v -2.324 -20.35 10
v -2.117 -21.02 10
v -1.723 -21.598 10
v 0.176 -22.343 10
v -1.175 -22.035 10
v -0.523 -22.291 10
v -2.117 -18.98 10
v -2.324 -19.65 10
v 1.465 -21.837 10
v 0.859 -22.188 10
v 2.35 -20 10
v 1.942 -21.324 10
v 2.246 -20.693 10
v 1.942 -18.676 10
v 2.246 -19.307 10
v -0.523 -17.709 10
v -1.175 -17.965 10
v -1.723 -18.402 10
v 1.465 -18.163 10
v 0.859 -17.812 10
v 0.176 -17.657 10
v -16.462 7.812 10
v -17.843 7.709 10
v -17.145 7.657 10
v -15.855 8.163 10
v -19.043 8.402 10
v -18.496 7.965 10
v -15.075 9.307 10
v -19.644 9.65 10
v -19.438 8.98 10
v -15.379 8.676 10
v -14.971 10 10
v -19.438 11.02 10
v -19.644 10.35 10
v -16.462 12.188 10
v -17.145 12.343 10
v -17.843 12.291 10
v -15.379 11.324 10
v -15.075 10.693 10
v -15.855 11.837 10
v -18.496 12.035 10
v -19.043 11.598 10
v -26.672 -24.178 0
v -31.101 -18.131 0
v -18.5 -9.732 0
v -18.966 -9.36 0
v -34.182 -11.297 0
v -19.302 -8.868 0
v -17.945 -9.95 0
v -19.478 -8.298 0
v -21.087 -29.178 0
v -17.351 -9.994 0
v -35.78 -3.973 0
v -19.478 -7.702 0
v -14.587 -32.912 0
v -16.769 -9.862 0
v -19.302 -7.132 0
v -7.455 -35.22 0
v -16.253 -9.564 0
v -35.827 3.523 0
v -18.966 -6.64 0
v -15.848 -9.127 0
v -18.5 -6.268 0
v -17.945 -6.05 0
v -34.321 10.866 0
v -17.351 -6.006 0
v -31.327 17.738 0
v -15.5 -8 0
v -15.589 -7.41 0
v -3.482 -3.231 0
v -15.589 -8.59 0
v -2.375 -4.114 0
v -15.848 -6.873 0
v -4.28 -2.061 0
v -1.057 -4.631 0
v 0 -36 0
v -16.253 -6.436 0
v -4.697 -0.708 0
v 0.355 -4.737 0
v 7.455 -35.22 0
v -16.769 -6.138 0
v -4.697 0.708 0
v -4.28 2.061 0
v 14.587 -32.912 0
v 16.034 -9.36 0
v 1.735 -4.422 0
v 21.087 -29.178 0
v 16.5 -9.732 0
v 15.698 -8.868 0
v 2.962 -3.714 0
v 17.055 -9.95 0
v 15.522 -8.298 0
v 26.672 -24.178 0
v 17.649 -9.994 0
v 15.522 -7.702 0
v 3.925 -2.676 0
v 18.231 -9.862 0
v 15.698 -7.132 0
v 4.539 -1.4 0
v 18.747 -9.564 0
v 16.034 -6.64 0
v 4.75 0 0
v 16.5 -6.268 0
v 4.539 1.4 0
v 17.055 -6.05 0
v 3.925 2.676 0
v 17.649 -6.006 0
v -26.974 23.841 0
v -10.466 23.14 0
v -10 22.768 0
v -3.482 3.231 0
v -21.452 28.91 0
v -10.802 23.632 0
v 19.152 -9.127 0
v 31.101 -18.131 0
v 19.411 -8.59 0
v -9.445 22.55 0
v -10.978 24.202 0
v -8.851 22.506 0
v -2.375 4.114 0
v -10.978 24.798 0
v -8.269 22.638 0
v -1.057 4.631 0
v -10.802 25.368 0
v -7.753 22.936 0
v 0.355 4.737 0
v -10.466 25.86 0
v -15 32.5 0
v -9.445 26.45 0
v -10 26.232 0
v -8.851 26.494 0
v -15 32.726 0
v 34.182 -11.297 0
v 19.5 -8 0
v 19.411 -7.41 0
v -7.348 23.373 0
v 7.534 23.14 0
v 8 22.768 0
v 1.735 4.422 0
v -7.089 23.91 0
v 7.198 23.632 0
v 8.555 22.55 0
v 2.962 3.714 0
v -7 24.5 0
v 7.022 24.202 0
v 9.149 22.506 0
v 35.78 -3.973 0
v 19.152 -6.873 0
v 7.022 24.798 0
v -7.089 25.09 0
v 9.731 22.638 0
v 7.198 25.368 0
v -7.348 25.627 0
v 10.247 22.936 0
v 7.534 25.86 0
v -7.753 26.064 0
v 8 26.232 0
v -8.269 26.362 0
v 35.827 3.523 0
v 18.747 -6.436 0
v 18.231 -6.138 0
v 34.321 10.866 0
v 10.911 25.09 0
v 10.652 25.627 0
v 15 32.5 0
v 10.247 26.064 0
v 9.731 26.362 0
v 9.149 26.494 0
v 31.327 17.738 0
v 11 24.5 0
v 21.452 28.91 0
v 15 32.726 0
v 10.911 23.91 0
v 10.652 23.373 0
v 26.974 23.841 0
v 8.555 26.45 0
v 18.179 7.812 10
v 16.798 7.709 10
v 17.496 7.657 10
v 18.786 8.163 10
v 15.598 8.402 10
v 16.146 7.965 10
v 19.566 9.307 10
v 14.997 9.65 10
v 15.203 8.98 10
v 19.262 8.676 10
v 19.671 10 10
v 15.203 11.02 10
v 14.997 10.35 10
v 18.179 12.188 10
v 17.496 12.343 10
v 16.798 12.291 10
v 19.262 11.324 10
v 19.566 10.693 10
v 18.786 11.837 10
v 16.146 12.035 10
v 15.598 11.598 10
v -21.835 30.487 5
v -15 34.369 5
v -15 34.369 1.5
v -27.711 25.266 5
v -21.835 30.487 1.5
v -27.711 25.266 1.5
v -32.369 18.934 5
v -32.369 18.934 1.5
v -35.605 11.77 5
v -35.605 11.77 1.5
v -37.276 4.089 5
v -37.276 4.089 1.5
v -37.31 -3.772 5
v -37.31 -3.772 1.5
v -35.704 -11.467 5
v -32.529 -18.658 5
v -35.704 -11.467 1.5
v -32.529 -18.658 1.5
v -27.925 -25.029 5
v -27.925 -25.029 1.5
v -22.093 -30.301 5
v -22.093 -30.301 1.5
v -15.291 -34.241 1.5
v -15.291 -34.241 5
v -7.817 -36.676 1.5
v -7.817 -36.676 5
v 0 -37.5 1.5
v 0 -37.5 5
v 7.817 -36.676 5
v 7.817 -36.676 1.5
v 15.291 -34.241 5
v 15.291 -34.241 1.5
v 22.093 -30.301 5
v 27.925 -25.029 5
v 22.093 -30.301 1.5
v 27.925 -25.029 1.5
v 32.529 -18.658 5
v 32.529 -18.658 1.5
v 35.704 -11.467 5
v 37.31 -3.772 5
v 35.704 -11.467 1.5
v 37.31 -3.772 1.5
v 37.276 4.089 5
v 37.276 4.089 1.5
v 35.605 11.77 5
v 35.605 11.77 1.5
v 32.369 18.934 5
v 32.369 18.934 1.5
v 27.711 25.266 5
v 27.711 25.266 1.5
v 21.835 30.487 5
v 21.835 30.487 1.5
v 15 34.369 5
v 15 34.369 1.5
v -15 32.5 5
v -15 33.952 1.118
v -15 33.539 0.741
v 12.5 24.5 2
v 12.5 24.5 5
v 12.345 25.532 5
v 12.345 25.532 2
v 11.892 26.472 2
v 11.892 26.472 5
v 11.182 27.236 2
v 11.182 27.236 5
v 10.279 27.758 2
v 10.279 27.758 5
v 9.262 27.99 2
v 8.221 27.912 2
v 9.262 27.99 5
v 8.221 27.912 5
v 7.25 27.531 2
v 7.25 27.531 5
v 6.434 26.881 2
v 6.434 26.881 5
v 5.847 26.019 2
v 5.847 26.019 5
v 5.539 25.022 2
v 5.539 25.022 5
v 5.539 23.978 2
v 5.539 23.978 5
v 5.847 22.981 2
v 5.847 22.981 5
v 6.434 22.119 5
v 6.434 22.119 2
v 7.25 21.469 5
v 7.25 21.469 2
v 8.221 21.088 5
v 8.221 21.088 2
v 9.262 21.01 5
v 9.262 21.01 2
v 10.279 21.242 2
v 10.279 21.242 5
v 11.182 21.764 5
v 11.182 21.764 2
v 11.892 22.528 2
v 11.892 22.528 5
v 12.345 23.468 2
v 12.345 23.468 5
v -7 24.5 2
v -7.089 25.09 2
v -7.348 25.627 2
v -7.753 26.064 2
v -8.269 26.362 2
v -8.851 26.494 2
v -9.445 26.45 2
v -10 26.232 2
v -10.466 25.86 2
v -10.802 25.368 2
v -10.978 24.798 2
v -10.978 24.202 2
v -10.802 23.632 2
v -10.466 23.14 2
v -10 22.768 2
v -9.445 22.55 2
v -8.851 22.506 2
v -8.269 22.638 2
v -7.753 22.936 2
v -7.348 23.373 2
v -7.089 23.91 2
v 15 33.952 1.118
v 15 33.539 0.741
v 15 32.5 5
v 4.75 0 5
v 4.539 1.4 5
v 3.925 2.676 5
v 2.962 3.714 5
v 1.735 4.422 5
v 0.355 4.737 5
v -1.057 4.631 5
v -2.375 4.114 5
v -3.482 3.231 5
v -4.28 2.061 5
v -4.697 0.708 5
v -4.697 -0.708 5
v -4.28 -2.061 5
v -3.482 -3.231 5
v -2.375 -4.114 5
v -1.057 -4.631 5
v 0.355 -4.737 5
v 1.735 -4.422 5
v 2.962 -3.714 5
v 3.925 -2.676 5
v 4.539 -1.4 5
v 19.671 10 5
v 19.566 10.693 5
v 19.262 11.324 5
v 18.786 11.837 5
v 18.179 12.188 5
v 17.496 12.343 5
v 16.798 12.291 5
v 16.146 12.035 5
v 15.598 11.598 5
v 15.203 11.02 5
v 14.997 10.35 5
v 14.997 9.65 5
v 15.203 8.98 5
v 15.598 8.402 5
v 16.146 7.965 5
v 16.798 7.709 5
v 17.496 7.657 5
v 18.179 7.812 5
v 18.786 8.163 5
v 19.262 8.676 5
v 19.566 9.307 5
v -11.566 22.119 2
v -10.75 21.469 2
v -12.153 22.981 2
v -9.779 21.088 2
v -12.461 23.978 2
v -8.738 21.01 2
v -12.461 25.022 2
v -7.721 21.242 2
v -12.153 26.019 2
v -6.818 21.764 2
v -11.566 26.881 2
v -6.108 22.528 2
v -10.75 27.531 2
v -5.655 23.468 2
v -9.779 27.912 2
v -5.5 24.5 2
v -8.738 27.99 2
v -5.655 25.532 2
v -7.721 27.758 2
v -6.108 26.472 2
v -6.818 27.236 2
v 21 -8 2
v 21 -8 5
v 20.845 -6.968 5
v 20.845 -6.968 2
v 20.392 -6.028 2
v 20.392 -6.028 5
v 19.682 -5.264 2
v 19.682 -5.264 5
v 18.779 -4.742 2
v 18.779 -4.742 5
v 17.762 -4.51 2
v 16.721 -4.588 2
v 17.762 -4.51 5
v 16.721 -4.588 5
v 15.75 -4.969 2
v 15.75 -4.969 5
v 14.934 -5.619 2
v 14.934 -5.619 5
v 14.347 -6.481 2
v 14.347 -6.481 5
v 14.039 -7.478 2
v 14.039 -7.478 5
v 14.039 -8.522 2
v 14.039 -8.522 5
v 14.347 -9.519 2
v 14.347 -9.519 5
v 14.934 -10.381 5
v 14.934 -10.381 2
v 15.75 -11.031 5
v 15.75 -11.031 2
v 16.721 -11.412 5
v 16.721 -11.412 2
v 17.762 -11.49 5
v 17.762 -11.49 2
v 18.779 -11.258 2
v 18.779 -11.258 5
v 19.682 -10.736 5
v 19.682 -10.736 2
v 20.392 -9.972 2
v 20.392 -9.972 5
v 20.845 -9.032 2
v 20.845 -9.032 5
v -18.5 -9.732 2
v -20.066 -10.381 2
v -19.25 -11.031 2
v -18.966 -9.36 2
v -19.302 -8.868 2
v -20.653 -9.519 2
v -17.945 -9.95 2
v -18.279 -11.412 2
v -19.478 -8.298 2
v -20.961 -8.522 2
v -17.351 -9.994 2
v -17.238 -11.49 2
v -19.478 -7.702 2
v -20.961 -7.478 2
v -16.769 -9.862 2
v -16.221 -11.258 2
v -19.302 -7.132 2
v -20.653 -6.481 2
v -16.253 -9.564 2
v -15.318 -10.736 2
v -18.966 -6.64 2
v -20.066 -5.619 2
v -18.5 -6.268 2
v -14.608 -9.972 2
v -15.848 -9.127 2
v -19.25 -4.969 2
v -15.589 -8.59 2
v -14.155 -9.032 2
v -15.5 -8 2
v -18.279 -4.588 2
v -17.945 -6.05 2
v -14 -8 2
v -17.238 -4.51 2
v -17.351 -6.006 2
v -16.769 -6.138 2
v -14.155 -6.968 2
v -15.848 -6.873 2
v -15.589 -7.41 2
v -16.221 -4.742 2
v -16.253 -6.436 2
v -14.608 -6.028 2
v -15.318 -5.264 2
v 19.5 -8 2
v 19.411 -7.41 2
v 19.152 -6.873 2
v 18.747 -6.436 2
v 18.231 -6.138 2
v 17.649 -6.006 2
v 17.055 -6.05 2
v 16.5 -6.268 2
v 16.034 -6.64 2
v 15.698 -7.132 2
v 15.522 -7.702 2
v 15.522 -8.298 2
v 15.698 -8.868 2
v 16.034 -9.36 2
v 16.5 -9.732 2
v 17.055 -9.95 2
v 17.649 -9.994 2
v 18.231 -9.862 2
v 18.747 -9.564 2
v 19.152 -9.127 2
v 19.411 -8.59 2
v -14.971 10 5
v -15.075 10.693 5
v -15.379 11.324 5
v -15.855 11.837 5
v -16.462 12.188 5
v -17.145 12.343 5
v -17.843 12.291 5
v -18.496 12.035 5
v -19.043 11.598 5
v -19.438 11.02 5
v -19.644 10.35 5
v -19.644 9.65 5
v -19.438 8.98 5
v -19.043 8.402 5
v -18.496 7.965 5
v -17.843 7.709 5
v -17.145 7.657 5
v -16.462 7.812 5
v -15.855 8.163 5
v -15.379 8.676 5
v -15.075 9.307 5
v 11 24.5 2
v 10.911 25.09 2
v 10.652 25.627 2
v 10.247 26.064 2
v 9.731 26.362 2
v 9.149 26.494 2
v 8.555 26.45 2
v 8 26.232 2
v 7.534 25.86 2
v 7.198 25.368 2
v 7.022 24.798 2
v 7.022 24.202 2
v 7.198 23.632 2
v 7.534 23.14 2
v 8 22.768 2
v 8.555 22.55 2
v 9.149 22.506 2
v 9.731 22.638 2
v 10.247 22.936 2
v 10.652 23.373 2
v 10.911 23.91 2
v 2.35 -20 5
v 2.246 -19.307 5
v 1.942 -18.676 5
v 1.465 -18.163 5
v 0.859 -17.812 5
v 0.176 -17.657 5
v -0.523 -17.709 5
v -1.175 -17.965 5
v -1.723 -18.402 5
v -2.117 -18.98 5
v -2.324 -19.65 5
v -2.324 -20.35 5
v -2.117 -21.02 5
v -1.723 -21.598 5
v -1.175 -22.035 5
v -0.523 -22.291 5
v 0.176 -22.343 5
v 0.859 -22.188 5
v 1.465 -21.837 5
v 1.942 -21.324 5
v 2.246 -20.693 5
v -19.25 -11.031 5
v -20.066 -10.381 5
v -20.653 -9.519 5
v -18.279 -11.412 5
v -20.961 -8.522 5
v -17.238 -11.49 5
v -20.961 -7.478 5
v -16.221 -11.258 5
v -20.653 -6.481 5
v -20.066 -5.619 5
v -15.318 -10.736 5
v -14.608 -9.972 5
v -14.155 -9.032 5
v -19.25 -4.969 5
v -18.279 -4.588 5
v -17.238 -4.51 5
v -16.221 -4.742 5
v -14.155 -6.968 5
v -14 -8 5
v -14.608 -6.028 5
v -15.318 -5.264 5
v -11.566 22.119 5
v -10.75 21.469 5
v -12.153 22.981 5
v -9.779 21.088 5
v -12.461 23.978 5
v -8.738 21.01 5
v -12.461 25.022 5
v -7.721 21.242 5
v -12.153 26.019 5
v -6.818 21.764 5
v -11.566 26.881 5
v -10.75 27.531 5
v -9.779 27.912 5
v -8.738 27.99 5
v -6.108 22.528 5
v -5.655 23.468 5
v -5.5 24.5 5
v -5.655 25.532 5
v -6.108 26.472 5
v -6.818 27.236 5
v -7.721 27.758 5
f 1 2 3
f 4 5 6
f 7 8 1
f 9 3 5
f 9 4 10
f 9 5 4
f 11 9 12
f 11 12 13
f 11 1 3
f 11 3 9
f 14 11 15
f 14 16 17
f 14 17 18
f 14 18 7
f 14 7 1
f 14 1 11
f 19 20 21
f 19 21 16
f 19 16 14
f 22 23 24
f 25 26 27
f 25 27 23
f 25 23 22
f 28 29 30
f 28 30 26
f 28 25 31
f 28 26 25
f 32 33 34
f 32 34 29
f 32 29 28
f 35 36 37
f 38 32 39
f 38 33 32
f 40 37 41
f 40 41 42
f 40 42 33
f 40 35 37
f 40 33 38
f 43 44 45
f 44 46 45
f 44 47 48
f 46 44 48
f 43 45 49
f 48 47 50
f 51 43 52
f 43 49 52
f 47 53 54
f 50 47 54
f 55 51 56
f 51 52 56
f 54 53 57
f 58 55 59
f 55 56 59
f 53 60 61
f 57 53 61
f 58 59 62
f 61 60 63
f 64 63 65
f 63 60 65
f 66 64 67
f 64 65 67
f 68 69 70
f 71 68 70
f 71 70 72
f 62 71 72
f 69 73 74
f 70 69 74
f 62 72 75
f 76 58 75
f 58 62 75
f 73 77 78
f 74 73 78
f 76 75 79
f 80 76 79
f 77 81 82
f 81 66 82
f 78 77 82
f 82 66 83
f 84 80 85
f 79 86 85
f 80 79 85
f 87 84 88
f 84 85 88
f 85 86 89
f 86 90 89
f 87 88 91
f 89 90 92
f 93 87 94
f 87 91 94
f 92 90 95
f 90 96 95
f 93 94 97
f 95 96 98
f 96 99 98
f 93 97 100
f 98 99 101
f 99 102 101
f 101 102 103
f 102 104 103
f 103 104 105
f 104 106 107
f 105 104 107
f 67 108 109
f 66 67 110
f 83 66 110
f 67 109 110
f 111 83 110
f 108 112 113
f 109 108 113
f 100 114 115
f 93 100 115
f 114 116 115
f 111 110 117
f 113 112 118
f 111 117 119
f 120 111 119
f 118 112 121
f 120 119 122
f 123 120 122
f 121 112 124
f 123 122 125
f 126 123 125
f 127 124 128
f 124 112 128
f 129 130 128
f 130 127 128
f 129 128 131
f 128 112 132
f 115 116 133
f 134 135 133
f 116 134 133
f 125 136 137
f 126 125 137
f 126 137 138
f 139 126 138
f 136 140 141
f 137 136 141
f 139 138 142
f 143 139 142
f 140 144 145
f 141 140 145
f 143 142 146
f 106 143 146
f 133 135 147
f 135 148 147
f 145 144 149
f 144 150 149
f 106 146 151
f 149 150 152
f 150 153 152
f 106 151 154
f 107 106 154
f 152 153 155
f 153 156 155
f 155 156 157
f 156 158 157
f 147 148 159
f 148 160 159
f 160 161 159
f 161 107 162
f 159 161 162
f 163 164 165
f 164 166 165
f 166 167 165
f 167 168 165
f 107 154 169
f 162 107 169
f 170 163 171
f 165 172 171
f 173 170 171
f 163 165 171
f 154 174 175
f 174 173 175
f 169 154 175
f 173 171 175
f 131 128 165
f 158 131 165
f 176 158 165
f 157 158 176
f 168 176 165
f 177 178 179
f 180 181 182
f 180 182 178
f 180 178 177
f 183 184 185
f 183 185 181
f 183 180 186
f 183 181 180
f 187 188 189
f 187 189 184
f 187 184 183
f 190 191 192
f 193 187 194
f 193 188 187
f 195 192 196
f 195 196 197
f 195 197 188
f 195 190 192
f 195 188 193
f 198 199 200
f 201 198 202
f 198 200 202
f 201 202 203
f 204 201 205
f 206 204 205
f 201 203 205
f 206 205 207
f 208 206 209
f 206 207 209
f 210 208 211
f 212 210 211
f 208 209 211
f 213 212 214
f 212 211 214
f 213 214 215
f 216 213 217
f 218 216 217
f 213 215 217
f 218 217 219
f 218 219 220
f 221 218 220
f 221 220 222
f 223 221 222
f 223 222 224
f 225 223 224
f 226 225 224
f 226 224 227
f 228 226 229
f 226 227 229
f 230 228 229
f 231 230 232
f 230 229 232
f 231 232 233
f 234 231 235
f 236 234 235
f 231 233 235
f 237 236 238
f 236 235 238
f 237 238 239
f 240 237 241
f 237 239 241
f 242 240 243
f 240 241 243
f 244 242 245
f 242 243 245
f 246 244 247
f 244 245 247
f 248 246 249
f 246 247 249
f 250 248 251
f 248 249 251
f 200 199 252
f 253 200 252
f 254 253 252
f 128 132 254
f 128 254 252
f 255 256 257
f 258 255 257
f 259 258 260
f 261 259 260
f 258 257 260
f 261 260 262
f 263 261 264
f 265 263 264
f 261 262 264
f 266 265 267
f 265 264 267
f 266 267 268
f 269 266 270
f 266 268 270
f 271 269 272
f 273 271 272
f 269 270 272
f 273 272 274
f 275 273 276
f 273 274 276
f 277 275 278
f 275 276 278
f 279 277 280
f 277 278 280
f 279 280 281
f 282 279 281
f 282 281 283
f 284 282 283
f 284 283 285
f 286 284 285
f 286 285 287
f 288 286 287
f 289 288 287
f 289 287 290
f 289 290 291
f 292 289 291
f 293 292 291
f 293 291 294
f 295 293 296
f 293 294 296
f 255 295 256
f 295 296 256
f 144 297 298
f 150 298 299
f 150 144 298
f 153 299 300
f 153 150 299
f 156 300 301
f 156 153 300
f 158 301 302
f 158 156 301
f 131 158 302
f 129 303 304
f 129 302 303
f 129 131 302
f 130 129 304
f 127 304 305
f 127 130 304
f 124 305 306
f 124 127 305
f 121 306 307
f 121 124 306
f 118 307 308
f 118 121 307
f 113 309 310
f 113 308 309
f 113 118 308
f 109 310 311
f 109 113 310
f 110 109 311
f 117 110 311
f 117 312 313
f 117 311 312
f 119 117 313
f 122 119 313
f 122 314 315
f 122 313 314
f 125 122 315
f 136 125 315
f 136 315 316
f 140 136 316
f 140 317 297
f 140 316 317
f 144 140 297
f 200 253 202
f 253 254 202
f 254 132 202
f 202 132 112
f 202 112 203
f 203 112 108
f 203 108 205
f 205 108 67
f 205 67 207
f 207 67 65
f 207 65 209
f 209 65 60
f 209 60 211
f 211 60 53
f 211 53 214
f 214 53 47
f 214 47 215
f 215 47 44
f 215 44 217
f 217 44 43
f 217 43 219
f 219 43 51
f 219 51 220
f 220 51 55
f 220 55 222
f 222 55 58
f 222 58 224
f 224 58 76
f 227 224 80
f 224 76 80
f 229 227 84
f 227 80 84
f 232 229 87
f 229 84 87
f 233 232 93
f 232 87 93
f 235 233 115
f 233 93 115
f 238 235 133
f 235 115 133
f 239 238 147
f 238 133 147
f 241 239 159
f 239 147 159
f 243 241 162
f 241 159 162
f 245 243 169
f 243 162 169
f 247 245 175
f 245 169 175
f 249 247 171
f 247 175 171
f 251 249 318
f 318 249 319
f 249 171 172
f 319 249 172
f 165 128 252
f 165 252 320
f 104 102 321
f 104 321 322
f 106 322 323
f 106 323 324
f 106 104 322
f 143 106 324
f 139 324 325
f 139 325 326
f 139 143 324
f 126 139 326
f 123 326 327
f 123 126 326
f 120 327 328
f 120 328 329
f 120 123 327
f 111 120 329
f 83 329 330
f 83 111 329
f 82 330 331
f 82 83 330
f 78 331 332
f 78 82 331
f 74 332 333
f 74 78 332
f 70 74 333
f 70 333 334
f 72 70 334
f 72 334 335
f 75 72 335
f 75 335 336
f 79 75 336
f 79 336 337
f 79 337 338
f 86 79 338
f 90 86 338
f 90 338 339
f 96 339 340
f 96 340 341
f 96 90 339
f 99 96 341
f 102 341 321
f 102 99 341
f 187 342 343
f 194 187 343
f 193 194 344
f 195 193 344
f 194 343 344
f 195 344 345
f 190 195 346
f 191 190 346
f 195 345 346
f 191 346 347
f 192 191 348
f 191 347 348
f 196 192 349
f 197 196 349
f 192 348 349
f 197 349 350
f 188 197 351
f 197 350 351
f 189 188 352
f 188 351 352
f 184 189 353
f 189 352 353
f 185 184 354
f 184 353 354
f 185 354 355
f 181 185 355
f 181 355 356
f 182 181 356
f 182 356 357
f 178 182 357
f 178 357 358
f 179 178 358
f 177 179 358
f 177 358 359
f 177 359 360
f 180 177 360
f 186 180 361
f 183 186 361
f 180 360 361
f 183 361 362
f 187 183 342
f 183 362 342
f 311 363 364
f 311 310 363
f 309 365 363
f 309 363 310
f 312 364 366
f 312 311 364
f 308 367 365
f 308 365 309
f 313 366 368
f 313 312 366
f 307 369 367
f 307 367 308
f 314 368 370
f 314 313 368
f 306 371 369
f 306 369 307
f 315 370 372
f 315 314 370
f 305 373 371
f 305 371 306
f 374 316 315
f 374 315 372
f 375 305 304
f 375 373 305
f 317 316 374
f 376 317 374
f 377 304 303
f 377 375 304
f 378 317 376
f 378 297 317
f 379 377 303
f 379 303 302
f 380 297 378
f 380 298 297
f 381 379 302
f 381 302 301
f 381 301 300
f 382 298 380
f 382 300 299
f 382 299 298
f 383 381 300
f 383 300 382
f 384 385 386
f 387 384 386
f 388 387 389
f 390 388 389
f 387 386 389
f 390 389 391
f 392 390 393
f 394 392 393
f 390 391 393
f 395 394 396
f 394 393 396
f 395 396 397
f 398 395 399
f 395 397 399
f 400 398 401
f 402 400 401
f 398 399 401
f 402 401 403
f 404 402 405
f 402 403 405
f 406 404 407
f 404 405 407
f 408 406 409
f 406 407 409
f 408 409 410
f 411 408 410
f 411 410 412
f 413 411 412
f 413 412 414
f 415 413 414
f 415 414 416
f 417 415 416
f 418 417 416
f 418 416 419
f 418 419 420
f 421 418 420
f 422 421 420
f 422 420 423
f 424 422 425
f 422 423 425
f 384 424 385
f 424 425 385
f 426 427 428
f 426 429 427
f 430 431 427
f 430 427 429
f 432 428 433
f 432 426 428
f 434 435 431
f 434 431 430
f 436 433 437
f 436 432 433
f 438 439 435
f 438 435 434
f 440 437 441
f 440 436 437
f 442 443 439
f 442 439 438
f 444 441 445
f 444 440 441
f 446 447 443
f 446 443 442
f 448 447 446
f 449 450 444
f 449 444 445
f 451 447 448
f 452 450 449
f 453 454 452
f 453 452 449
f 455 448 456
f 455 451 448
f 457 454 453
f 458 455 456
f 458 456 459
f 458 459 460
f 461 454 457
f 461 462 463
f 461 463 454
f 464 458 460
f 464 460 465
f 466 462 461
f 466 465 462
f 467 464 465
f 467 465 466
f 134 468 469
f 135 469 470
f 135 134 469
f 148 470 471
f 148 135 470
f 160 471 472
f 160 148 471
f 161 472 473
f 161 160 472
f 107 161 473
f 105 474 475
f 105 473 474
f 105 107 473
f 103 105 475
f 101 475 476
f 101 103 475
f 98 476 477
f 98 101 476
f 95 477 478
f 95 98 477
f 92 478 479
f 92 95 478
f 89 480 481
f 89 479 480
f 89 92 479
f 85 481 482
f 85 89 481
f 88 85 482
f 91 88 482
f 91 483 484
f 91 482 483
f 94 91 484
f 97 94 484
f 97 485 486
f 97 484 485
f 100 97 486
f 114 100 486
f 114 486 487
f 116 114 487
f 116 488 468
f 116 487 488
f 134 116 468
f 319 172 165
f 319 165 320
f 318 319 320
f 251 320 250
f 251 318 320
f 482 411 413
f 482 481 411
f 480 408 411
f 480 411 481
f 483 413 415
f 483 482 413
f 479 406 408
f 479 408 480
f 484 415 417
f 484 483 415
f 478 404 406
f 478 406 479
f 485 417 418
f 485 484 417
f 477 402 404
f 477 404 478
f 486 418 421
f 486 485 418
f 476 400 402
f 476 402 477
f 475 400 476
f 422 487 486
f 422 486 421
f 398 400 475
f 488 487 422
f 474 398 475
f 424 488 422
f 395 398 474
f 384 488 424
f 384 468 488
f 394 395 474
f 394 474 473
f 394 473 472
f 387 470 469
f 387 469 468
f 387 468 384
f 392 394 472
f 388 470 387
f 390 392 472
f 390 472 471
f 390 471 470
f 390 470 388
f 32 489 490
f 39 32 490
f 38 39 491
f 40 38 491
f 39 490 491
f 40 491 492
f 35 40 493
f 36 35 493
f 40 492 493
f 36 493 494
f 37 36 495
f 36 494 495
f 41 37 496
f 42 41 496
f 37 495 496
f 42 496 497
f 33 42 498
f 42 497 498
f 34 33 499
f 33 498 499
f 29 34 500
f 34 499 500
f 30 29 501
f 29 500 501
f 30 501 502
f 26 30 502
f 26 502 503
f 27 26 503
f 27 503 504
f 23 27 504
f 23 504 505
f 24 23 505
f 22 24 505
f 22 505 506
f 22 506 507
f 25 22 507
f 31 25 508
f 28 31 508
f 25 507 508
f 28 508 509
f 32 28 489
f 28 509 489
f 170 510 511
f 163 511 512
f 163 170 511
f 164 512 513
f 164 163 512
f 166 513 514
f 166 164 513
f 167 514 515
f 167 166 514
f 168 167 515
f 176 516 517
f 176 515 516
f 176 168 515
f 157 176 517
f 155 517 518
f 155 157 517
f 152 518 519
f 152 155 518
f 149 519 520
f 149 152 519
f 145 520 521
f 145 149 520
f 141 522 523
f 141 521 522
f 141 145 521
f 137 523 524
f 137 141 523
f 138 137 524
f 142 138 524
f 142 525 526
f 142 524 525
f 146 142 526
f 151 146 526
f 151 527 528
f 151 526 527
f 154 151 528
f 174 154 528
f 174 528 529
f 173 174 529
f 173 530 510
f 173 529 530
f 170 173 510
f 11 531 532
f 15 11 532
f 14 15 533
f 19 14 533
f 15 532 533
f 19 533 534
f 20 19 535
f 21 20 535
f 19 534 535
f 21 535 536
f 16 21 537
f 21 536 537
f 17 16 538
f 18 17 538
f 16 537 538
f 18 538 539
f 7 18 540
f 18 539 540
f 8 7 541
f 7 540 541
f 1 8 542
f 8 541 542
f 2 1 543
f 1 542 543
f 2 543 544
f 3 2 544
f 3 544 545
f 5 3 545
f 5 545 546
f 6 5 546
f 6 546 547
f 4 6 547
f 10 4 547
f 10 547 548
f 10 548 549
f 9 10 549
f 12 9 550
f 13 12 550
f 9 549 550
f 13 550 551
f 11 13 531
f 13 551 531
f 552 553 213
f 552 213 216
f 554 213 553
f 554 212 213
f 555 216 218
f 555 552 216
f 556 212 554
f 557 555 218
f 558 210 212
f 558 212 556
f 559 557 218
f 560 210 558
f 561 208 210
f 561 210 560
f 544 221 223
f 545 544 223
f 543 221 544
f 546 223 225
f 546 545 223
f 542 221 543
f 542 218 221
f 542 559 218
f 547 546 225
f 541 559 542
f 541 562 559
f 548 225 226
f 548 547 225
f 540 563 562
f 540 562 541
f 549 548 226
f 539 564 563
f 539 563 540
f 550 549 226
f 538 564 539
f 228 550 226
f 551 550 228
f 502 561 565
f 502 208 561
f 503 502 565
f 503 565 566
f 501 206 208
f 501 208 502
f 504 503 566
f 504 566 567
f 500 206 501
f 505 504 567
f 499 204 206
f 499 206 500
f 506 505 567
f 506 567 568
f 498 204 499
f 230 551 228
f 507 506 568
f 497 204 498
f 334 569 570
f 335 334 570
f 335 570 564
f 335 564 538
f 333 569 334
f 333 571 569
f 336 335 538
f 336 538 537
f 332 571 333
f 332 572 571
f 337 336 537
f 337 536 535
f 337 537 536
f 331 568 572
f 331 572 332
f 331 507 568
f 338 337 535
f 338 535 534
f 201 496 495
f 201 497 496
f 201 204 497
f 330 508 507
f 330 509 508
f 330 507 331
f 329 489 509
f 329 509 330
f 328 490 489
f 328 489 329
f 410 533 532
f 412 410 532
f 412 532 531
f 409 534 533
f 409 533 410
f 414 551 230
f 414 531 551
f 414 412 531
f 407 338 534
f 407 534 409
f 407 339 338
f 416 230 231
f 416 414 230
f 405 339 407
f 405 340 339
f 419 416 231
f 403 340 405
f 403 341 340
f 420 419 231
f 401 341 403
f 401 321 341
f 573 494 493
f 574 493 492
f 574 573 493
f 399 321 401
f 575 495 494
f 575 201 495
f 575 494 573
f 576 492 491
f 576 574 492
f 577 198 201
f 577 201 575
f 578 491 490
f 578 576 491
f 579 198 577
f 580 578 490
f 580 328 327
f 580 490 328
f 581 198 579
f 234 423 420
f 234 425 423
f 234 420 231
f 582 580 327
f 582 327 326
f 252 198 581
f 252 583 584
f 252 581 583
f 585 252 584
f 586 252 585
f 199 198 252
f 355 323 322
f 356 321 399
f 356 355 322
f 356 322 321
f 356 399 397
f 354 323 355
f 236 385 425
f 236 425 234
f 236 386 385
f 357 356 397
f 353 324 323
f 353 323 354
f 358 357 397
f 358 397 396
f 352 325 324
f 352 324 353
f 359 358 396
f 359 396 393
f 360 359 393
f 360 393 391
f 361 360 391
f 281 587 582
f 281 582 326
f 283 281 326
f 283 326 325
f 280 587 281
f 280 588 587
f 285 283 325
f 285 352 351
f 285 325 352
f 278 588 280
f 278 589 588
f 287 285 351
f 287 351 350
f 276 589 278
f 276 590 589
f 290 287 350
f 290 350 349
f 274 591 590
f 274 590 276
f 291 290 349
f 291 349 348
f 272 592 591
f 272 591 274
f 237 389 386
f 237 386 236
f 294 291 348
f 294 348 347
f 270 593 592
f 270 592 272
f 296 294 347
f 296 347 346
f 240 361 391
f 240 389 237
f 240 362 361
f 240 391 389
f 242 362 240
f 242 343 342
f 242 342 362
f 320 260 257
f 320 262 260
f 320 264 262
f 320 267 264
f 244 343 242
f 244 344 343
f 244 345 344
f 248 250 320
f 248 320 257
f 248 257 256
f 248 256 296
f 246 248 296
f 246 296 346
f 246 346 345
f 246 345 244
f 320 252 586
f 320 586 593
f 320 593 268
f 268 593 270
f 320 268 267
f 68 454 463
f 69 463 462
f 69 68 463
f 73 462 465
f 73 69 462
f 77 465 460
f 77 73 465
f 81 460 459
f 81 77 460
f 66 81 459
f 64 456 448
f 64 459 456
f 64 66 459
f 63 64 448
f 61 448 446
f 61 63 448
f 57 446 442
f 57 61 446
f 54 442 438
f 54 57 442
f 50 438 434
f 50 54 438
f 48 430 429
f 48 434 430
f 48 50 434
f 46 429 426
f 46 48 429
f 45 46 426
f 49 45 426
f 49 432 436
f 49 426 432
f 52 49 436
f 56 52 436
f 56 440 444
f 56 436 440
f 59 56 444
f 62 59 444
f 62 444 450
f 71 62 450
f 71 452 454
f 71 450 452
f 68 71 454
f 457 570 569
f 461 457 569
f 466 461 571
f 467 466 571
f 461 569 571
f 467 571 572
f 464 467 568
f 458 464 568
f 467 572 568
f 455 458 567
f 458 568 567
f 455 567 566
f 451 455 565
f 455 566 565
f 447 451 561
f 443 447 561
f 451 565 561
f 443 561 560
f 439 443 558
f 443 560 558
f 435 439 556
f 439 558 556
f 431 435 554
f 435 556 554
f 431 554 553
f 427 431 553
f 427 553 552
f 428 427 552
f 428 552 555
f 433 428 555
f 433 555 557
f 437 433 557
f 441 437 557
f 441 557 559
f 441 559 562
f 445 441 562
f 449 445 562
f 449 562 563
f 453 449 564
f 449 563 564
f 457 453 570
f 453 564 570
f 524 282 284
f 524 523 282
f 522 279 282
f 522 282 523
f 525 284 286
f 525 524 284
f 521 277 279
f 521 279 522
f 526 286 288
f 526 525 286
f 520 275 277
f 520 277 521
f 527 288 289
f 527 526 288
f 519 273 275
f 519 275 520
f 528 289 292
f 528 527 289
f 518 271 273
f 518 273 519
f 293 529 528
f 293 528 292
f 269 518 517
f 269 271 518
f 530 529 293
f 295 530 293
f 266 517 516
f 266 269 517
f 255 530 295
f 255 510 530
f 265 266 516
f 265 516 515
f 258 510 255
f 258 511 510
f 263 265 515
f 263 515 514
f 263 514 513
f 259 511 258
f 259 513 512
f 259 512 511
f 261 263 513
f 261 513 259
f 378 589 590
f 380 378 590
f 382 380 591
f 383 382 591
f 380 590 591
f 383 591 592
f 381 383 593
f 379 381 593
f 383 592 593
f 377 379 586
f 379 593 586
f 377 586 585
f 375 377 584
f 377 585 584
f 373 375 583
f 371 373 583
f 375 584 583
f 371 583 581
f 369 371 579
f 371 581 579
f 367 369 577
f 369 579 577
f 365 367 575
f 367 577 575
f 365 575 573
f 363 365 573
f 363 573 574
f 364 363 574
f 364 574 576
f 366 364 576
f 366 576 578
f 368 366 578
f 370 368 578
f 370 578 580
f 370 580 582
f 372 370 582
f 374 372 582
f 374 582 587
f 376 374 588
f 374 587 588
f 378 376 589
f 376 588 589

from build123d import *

# Parameters (mm, degrees)
SKETCH_R     = 4.75
SKETCH_R_2   = 2
PAD_DEPTH    = 5
SKETCH001_R  = 2.35
PAD001_DEPTH = 5
SKETCH002_R  = 3.5
POCKET_DEPTH = 3
CHAMFER_SIZE = 1.5


with BuildPart() as part:
    # Sketch → Pad (new body)
    with BuildSketch(Plane.XY):
        with BuildLine():
            ThreePointArc((-15, 34.369318), (0, -37.5), (15, 34.369318))
            Line((15, 32.5), (15, 34.369318))
            Line((-15, 32.5), (15, 32.5))
            Line((-15, 34.369318), (-15, 32.5))
        make_face()
        Circle(SKETCH_R, mode=Mode.SUBTRACT)
        with Locations((-9, 24.5)):
            Circle(SKETCH_R_2, mode=Mode.SUBTRACT)
        with Locations((9, 24.5)):
            Circle(SKETCH_R_2, mode=Mode.SUBTRACT)
        with Locations((-17.5, -8)):
            Circle(SKETCH_R_2, mode=Mode.SUBTRACT)
        with Locations((17.5, -8)):
            Circle(SKETCH_R_2, mode=Mode.SUBTRACT)
    extrude(amount=PAD_DEPTH)

    # Sketch001 (on Face11 of Pad) → Pad001 (join)
    with BuildSketch(Plane.XY.offset(5)):
        with Locations((17.320508, 10)):
            Circle(SKETCH001_R)
        with Locations((-17.320508, 10)):
            Circle(SKETCH001_R)
        with Locations((0, -20)):
            Circle(SKETCH001_R)
    extrude(amount=PAD001_DEPTH)

    # Sketch002 (on Face5 of Pad001) → Pocket (cut)
    with BuildSketch(Plane.XY.offset(5)):
        with Locations((-9, 24.5)):
            Circle(SKETCH002_R)
        with Locations((9, 24.5)):
            Circle(SKETCH002_R)
        with Locations((17.5, -8)):
            Circle(SKETCH002_R)
        with Locations((-17.5, -8)):
            Circle(SKETCH002_R)
    extrude(amount=-POCKET_DEPTH, mode=Mode.SUBTRACT)

    # Chamfer
    chamfer_edges = [part.edges().sort_by_distance(p)[0] for p in [
        (0, -37.5, 0),
    ]]
    chamfer(chamfer_edges, length=CHAMFER_SIZE)


solid = part.part
